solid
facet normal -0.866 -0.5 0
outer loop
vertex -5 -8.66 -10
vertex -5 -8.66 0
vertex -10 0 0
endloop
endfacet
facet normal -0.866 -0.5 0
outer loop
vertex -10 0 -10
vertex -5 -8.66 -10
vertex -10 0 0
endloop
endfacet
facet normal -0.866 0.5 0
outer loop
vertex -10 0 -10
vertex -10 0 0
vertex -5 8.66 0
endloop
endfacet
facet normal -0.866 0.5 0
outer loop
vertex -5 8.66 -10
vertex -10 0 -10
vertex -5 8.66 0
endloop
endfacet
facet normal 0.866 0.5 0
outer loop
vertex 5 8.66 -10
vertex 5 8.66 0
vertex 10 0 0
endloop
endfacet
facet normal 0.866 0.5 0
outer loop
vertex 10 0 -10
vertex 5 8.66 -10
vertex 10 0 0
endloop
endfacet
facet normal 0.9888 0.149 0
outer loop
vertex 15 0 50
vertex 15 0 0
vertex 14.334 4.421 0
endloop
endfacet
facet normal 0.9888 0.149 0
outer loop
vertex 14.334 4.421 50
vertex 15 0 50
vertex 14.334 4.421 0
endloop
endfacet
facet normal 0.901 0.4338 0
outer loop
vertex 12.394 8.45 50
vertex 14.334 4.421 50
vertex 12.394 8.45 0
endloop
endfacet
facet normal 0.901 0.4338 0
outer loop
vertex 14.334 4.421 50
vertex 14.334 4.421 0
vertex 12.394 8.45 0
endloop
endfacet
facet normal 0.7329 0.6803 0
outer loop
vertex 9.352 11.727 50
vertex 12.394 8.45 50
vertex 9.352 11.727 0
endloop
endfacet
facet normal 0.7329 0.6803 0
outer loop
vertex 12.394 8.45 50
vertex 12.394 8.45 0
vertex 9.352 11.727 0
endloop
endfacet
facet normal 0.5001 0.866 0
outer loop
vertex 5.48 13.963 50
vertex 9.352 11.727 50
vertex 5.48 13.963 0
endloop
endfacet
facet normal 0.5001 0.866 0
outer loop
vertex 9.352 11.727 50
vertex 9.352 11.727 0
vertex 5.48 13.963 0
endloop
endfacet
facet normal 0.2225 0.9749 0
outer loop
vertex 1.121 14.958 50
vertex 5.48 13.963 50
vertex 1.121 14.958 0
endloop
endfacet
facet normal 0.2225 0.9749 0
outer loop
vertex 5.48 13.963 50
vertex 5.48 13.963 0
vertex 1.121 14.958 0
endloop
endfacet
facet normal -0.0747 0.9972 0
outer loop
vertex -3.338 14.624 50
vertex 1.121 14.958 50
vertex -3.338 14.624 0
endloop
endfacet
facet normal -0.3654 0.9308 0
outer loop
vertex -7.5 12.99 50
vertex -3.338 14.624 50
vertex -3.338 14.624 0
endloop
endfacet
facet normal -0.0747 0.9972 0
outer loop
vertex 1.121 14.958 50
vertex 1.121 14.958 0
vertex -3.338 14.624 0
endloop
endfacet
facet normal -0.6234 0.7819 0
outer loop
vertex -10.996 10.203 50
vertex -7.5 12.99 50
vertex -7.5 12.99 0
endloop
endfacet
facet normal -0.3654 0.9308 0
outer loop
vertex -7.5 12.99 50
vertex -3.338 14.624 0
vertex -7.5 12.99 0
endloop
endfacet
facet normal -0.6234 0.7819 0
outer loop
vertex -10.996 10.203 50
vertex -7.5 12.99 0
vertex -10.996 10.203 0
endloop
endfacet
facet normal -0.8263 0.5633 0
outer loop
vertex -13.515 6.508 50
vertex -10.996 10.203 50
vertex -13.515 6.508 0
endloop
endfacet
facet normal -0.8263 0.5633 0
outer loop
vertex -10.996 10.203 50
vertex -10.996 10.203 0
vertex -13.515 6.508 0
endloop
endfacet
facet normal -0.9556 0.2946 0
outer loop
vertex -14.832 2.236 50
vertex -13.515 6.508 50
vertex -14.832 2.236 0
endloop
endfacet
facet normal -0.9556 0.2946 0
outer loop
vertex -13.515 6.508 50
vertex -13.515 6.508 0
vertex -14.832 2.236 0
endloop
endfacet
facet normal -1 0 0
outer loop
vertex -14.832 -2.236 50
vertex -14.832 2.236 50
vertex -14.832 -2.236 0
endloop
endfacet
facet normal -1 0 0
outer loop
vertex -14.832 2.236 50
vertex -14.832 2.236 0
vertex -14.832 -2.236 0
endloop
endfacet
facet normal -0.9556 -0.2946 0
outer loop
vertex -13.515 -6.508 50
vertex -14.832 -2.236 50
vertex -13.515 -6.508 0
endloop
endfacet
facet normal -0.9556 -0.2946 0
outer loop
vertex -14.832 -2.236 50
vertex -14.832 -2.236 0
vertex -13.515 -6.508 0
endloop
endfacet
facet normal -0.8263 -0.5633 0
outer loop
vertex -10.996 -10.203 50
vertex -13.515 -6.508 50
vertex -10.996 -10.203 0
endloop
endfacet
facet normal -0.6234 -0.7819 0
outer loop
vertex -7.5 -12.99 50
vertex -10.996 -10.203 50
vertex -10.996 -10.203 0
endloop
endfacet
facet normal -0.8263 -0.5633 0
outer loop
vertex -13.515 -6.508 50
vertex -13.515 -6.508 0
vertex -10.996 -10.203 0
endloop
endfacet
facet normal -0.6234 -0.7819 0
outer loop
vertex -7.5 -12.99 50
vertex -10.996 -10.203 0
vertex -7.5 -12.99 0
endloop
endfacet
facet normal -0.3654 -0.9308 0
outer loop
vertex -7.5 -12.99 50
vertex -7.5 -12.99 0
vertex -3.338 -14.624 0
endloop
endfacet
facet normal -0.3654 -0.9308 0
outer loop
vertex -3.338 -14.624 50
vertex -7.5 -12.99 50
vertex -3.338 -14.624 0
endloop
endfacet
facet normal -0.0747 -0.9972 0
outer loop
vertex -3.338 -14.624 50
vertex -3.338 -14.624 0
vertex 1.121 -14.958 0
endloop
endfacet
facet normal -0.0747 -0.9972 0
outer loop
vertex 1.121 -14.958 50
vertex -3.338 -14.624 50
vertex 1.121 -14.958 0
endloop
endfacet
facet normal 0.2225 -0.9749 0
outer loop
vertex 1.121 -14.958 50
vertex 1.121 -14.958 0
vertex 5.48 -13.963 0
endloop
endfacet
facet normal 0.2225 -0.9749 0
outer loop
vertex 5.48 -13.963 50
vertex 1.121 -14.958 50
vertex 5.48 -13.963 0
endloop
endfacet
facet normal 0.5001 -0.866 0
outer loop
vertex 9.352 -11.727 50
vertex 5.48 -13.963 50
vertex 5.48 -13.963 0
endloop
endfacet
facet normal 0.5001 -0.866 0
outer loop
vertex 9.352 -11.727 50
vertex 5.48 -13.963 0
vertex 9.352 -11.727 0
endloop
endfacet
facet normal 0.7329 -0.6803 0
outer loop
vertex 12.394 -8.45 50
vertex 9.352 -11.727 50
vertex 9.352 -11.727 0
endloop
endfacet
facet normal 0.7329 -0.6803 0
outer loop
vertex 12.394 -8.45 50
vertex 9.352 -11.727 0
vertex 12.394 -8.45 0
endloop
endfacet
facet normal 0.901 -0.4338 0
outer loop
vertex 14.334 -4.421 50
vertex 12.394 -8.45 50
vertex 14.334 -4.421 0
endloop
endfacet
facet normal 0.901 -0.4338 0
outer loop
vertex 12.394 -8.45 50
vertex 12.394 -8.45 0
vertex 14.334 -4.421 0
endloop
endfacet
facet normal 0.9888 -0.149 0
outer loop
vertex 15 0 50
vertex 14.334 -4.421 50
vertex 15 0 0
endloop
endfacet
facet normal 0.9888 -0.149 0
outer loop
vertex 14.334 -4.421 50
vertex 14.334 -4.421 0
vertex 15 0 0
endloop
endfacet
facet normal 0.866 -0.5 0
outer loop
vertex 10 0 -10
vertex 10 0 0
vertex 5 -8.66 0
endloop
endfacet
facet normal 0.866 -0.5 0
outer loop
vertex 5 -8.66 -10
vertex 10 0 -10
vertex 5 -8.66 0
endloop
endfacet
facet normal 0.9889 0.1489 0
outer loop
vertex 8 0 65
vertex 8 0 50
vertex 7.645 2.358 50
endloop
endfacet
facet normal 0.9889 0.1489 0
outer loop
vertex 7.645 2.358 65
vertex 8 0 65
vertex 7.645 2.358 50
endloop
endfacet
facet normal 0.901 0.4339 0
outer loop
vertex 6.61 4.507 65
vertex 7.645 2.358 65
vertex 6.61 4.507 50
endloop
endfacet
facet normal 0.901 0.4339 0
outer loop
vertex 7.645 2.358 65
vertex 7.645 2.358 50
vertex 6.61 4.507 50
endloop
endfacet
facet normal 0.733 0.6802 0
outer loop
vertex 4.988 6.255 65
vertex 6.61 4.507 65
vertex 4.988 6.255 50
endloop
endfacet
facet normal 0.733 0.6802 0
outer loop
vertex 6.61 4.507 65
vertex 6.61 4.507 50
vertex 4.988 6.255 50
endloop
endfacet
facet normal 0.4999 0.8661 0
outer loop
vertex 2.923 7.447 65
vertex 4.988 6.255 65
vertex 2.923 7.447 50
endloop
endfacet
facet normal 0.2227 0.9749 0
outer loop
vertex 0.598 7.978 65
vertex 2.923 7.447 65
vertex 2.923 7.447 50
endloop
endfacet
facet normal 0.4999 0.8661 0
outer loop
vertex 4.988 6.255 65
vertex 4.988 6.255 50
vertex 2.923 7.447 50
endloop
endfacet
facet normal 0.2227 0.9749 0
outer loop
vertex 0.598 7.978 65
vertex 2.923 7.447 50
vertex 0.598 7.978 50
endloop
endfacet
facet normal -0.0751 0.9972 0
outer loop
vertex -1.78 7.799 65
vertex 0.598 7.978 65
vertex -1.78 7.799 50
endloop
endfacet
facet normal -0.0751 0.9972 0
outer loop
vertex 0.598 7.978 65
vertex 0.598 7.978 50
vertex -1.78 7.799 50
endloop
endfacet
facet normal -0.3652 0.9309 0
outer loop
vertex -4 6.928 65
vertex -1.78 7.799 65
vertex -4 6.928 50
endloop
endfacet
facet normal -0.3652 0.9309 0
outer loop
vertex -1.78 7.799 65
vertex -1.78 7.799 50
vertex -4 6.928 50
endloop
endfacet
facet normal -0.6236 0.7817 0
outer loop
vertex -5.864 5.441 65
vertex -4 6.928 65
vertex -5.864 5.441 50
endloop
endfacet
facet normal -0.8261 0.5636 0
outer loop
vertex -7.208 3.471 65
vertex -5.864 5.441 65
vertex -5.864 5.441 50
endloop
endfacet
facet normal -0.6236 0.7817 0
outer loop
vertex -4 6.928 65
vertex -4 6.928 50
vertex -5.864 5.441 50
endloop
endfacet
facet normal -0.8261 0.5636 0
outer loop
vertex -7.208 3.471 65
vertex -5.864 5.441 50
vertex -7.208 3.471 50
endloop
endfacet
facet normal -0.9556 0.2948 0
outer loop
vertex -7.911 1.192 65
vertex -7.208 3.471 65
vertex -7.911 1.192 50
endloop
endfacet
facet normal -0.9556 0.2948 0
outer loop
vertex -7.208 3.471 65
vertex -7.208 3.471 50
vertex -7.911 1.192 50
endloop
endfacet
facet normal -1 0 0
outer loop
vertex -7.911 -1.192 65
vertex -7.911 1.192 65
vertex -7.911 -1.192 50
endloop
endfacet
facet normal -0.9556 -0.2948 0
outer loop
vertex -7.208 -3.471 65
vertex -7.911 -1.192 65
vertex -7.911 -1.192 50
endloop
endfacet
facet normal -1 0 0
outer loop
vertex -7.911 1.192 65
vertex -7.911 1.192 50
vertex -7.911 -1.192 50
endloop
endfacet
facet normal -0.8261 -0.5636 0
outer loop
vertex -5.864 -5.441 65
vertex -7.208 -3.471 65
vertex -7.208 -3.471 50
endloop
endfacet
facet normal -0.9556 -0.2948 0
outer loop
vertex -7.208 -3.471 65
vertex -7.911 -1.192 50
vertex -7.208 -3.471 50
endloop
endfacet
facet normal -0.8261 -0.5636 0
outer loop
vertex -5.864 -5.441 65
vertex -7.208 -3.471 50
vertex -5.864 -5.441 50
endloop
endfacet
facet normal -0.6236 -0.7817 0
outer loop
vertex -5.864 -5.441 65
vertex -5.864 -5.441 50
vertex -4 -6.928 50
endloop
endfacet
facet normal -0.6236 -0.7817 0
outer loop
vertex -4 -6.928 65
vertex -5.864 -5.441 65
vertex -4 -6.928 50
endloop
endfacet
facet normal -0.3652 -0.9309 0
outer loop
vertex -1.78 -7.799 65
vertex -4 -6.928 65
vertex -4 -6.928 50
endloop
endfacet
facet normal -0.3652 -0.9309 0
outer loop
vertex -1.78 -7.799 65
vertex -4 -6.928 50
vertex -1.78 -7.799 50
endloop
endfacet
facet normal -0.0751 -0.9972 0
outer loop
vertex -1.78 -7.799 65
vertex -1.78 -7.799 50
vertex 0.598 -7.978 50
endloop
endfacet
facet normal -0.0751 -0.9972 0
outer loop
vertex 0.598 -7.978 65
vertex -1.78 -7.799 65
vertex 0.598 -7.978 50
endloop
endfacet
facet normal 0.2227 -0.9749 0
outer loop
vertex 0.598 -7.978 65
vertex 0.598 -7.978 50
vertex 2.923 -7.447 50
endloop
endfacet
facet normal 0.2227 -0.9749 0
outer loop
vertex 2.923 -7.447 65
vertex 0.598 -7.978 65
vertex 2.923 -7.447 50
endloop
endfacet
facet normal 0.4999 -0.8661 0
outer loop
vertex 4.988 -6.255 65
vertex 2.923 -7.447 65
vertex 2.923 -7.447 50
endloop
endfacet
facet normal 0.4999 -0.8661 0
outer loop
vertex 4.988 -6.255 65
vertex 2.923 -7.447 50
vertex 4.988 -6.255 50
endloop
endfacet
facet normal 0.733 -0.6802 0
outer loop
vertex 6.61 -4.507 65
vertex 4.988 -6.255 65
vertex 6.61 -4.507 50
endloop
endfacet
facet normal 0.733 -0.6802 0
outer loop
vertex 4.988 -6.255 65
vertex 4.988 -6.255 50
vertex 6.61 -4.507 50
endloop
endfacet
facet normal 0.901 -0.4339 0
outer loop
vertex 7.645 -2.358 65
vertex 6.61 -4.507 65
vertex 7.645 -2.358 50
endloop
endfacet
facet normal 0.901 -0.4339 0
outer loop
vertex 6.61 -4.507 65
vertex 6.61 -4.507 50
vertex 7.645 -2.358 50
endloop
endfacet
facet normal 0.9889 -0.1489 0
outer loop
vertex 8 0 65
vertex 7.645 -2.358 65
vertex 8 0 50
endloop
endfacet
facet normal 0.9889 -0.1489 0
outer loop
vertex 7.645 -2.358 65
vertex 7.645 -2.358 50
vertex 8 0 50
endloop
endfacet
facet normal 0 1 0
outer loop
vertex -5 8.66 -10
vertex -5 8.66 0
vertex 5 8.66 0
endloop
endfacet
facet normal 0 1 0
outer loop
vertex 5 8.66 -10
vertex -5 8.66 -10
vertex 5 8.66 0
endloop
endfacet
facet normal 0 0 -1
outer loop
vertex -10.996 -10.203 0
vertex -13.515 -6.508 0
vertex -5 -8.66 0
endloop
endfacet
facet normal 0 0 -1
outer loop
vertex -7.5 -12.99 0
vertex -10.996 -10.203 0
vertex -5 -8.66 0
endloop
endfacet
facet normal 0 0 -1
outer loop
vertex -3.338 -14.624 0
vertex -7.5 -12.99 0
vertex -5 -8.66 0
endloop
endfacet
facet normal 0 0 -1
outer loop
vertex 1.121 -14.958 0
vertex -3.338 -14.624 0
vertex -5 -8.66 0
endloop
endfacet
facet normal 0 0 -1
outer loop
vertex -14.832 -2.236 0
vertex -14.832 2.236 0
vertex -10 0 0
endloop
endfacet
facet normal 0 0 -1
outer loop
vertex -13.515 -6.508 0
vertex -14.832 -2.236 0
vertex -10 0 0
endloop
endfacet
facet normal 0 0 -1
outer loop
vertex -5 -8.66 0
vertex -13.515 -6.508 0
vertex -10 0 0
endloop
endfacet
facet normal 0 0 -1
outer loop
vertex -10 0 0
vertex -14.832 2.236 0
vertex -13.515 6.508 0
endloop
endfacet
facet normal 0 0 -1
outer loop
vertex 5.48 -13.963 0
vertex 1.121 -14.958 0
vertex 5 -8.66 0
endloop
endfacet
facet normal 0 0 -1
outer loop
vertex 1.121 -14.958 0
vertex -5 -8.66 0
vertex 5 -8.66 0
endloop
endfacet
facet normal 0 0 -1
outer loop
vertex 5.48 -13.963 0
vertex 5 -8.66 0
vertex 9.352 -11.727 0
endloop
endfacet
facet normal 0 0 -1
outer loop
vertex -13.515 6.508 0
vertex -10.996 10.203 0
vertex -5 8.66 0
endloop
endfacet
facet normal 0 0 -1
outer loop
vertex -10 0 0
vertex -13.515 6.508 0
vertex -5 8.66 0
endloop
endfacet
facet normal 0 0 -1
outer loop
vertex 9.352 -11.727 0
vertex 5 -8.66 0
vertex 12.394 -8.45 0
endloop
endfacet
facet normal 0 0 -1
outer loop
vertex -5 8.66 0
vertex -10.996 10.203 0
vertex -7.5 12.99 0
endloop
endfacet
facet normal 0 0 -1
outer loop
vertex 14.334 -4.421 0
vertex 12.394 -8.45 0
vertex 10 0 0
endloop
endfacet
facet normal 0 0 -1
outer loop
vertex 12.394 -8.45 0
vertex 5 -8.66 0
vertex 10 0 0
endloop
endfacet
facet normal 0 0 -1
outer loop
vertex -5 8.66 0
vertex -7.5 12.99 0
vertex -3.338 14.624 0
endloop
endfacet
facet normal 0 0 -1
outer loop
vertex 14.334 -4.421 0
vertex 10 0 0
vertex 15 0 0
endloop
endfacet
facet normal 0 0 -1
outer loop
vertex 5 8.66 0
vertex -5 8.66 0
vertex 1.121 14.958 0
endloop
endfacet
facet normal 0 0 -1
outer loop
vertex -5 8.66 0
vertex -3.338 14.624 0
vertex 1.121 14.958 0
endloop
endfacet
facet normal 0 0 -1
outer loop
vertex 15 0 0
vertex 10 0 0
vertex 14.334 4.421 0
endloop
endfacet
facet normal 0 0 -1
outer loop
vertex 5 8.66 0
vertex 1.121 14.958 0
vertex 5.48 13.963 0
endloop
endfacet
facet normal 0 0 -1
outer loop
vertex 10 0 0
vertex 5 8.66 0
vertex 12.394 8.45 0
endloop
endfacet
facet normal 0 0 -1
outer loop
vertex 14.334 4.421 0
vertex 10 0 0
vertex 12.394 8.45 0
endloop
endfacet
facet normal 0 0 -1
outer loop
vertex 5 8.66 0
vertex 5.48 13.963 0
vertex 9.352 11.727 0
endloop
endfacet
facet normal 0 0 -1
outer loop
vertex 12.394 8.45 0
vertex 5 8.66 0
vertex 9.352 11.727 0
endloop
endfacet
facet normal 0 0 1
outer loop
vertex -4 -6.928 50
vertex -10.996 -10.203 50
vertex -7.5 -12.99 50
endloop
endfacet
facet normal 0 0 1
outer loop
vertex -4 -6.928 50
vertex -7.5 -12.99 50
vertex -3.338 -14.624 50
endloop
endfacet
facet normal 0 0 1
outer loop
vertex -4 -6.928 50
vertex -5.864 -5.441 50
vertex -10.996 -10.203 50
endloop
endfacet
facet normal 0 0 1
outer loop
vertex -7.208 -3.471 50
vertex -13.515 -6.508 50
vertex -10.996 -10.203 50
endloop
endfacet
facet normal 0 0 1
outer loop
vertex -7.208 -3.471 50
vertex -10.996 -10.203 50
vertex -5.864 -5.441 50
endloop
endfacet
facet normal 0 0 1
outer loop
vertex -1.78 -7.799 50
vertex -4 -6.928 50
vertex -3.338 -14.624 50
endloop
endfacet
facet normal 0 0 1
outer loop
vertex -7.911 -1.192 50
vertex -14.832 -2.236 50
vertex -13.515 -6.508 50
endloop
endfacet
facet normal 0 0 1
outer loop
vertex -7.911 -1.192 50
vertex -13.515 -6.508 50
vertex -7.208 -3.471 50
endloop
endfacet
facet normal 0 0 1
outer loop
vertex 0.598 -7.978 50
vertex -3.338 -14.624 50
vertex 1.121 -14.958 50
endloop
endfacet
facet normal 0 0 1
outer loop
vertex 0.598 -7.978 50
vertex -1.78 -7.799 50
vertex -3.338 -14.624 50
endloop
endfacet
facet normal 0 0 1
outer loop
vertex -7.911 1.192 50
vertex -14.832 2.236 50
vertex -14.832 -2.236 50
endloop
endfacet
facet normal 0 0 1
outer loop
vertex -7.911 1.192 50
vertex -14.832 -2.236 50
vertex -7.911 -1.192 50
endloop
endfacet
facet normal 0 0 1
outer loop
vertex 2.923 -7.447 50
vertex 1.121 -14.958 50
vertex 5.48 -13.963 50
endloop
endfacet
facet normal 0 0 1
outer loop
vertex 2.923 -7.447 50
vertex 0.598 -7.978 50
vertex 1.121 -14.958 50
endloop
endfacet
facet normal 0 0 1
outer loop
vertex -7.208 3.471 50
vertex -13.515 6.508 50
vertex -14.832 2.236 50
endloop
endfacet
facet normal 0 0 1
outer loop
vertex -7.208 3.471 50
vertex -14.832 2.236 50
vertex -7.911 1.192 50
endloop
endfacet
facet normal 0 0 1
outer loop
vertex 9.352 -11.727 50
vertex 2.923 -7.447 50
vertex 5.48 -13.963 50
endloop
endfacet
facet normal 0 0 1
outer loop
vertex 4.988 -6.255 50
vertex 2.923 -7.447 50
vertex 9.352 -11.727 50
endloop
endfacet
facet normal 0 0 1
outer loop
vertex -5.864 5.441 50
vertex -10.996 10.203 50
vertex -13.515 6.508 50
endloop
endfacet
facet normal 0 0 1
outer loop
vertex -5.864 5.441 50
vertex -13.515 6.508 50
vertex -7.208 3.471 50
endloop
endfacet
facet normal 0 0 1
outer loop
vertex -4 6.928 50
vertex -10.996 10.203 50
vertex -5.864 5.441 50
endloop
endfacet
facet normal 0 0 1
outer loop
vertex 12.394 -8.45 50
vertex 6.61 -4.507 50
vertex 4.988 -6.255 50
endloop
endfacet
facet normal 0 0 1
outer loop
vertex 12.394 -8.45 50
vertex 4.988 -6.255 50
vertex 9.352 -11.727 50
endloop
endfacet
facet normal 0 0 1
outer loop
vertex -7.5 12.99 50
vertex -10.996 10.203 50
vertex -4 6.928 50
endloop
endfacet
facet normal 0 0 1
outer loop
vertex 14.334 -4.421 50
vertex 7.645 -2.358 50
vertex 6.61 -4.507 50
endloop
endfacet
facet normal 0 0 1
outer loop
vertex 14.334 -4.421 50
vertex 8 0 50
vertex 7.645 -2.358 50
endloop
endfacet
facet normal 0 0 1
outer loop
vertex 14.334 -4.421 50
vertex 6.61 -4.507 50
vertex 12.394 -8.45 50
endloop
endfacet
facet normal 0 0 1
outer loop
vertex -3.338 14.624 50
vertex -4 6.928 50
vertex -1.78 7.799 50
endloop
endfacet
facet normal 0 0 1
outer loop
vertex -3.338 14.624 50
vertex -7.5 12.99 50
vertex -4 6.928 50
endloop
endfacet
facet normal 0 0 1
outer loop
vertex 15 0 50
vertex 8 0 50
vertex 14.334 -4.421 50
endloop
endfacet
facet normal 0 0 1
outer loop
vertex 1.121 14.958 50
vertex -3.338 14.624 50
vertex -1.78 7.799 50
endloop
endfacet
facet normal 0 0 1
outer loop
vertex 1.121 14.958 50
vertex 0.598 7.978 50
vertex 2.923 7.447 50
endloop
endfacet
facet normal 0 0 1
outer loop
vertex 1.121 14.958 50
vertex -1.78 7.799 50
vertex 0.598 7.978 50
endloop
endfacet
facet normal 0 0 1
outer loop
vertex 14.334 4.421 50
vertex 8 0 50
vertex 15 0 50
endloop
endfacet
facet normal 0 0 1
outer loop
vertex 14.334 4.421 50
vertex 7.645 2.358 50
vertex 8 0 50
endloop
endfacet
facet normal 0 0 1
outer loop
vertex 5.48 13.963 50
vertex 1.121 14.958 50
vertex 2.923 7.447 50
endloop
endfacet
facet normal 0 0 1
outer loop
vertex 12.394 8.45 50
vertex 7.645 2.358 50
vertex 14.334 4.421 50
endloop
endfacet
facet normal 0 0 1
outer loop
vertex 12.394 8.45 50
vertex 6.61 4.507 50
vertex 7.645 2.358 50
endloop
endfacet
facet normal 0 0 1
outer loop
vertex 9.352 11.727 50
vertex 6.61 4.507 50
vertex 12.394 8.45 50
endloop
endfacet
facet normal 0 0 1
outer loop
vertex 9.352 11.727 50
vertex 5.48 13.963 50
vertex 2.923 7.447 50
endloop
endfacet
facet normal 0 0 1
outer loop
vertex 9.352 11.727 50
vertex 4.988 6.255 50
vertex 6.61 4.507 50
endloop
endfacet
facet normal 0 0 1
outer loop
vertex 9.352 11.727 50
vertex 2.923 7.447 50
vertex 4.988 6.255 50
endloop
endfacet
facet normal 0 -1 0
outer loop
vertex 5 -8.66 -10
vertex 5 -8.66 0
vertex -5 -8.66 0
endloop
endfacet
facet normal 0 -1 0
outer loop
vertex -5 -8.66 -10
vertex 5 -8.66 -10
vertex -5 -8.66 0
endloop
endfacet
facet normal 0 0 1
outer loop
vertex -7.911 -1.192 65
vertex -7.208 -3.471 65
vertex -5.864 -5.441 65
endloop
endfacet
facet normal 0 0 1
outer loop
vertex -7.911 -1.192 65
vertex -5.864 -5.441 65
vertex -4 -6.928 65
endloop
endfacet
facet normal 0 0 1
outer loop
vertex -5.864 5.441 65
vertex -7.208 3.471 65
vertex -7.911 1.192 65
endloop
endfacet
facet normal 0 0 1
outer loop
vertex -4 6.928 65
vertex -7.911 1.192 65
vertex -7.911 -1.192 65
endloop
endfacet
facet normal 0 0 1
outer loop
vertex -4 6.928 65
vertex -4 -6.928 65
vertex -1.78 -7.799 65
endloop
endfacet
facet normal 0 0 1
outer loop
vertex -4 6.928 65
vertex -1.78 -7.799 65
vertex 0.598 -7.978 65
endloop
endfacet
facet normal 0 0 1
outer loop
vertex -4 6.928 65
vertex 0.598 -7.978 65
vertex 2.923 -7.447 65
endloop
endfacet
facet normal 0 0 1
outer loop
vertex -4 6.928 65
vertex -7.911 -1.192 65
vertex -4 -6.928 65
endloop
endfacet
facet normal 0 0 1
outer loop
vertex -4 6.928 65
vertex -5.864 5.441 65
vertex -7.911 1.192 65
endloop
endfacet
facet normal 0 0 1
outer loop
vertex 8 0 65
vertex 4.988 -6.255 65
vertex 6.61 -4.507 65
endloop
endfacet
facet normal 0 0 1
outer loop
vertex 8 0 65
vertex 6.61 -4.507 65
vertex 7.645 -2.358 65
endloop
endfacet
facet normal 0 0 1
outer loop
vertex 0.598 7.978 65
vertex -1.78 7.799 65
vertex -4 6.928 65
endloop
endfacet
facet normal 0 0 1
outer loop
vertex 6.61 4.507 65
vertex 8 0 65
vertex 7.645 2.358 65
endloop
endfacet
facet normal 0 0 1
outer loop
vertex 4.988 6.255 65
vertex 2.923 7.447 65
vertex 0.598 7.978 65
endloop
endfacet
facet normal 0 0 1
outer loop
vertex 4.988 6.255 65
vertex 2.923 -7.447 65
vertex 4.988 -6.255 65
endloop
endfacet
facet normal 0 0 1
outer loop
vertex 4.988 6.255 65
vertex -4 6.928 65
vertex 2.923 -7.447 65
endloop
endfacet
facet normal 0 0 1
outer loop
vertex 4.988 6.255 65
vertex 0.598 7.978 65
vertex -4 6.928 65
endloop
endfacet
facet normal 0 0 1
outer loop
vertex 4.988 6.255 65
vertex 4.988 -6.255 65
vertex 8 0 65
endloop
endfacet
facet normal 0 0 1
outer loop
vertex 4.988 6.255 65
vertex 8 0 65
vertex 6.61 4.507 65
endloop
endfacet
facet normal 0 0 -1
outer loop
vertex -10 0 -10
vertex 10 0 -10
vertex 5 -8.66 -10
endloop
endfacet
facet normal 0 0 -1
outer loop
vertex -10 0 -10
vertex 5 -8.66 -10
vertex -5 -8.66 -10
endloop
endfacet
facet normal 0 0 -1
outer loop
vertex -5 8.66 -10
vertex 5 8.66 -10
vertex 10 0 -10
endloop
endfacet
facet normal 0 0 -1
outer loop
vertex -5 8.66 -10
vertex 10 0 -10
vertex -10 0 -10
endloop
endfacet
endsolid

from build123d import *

# Parameters (mm, degrees)
SCHIZZO1_R                   = 15
ESTRUSIONE_ESTRUSIONE1_DEPTH = 50
SCHIZZO2_R                   = 8
ESTRUSIONE_ESTRUSIONE2_DEPTH = 15
ESTRUSIONE_ESTRUSIONE3_DEPTH = 10


with BuildPart() as part:
    # Schizzo1 → Estrusione-Estrusione1 (new body)
    with BuildSketch(Plane.XY):
        Circle(SCHIZZO1_R)
    extrude(amount=ESTRUSIONE_ESTRUSIONE1_DEPTH)

    # Schizzo2 → Estrusione-Estrusione2 (add)
    with BuildSketch(Plane.XY.offset(50)):
        Circle(SCHIZZO2_R)
    extrude(amount=ESTRUSIONE_ESTRUSIONE2_DEPTH)

    # Schizzo3 → Estrusione-Estrusione3 (add)
    with BuildSketch(Plane(origin=(0, 0, 0), x_dir=(-1, 0, 0), z_dir=(0, 0, -1))):
        Polygon((10, 0), (5, 8.660254038), (-5, 8.660254038), (-10, 0), (-5, -8.660254038), (5, -8.660254038), align=None)
    extrude(amount=ESTRUSIONE_ESTRUSIONE3_DEPTH)


solid = part.part
